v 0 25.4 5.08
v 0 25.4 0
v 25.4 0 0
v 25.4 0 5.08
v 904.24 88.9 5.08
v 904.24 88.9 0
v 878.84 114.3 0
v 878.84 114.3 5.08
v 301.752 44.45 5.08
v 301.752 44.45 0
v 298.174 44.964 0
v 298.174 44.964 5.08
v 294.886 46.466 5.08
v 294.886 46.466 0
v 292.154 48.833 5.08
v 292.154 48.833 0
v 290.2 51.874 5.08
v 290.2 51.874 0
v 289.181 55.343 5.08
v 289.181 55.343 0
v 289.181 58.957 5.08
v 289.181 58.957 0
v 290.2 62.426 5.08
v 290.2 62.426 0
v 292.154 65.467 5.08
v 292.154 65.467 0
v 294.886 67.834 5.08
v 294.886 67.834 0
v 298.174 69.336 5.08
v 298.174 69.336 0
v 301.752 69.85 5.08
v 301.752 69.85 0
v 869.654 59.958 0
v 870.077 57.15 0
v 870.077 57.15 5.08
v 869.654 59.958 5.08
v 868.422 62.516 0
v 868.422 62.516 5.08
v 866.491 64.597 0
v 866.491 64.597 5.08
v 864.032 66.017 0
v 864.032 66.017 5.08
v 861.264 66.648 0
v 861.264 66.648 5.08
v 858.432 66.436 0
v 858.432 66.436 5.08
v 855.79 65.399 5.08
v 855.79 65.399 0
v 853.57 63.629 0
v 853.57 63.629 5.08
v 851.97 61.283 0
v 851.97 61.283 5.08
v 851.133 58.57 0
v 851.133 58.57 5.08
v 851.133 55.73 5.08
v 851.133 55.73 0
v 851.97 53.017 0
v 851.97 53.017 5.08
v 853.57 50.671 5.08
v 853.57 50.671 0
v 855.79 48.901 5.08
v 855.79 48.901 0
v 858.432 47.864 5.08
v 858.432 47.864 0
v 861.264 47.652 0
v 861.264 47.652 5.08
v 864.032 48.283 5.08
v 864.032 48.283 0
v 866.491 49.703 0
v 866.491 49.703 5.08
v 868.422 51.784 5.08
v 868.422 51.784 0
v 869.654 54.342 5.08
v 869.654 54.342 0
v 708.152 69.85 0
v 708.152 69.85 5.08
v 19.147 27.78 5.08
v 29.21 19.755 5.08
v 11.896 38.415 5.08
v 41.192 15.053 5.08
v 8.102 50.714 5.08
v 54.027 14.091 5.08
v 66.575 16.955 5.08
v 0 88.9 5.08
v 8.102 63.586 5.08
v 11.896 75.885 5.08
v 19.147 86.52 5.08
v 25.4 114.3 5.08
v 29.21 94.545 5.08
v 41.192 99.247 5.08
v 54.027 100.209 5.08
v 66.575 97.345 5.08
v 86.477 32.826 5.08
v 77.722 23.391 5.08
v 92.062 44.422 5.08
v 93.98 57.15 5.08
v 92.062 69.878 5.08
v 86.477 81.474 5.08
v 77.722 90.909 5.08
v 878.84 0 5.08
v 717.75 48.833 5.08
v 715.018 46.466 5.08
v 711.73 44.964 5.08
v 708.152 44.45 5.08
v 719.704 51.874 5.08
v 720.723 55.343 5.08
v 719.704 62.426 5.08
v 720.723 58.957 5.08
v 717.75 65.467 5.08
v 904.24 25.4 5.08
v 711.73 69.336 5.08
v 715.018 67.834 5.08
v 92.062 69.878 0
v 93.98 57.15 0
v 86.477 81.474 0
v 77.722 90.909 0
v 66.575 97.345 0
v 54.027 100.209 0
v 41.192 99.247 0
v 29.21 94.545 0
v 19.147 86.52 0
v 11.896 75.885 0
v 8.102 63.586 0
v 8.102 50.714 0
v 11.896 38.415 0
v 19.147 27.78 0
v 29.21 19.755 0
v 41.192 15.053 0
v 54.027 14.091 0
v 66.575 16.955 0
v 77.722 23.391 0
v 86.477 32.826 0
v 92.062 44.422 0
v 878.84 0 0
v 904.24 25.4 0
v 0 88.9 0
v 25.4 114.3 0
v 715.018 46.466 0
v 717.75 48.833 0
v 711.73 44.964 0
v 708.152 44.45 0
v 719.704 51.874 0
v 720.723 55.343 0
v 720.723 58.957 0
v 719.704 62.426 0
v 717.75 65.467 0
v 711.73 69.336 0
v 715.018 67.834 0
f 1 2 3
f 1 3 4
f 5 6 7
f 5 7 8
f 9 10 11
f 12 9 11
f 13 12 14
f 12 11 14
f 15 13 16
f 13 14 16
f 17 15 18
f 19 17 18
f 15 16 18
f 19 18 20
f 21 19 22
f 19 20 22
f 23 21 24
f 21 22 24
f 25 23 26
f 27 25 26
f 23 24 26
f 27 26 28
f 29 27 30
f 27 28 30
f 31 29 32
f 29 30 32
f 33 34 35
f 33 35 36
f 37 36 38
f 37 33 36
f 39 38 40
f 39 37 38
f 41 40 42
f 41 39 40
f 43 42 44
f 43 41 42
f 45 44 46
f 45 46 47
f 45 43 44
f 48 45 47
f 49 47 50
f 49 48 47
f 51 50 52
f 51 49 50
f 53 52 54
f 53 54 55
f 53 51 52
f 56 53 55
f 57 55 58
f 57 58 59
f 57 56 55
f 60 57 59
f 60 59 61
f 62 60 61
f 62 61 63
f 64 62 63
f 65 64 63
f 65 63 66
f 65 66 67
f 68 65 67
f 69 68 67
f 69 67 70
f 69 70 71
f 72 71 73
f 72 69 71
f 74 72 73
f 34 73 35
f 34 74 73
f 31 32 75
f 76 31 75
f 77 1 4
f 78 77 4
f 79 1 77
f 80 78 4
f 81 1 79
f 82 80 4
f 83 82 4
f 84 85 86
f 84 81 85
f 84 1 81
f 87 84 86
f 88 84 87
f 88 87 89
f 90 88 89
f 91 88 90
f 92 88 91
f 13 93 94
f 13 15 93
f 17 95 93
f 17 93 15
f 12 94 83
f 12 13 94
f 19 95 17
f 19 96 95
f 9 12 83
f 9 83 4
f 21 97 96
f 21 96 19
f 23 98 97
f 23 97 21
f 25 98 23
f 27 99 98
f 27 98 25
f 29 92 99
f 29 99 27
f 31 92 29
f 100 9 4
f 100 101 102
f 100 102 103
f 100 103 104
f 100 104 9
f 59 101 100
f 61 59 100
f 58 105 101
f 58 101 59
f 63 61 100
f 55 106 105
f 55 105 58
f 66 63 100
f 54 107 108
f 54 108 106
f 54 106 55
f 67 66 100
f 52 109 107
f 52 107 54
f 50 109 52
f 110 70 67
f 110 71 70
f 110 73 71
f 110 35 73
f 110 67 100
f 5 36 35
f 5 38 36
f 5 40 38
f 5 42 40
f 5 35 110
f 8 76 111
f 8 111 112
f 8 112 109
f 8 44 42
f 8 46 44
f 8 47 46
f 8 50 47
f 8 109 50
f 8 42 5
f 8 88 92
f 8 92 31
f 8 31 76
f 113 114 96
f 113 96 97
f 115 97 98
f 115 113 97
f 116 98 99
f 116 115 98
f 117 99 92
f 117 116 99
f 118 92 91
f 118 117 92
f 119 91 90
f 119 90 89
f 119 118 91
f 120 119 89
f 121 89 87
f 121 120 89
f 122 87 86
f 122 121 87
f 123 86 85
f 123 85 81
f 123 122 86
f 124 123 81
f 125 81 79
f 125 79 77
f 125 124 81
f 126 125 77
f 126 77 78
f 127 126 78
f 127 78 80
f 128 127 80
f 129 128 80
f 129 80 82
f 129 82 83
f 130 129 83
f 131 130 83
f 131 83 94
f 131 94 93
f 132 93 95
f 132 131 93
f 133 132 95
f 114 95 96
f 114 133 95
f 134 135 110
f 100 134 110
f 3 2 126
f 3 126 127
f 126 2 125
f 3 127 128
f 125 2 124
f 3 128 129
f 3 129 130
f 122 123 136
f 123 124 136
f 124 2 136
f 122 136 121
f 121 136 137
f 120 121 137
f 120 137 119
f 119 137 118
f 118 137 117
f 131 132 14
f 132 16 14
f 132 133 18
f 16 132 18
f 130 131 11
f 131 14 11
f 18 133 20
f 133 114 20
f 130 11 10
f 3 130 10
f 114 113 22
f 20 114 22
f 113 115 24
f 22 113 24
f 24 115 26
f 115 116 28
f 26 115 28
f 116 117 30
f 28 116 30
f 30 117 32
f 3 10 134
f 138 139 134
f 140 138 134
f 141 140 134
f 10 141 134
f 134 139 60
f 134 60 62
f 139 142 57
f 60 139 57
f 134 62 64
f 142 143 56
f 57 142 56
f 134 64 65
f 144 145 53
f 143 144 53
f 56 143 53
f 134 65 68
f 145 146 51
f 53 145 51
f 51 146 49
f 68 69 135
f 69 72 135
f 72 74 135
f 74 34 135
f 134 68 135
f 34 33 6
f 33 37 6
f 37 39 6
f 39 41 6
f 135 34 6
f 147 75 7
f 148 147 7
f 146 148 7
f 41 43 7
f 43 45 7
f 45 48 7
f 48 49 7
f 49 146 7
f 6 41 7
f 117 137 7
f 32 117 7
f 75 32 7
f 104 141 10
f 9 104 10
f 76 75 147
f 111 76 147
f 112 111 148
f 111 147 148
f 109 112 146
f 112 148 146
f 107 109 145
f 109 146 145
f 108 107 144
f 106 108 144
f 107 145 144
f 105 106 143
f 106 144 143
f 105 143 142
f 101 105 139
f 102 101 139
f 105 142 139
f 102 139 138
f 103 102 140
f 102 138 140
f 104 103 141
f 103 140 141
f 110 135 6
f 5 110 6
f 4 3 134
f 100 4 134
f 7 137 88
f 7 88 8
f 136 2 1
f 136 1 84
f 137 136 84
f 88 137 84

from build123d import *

# Parameters (mm, degrees)
SKETCH1_W           = 904.24
SKETCH1_H           = 114.3
SKETCH1_R           = 43.18
SKETCH1_R_2         = 9.525
BOSS_EXTRUDE1_DEPTH = 5.08
CHAMFER1_SIZE       = 25.4


with BuildPart() as part:
    # Sketch1 → Boss-Extrude1 (new body)
    with BuildSketch(Plane.XY):
        with Locations((452.12, 57.15)):
            Rectangle(SKETCH1_W, SKETCH1_H)
        with Locations((50.8, 57.15)):
            Circle(SKETCH1_R, mode=Mode.SUBTRACT)
        with Locations((860.552, 57.15)):
            Circle(SKETCH1_R_2, mode=Mode.SUBTRACT)
        with BuildLine():
            Line((301.752, 69.85), (708.152, 69.85))
            ThreePointArc((708.152, 69.85), (720.852, 57.15), (708.152, 44.45))
            Line((708.152, 44.45), (301.752, 44.45))
            ThreePointArc((301.752, 44.45), (289.052, 57.15), (301.752, 69.85))
        make_face(mode=Mode.SUBTRACT)
    extrude(amount=BOSS_EXTRUDE1_DEPTH)

    # Chamfer1
    chamfer1_edges = [part.edges().sort_by_distance(p)[0] for p in [
        (0, 114.3, 2.54),
        (904.24, 114.3, 2.54),
        (904.24, 0, 2.54),
        (0, 0, 2.54),
    ]]
    chamfer(chamfer1_edges, length=CHAMFER1_SIZE)


solid = part.part
